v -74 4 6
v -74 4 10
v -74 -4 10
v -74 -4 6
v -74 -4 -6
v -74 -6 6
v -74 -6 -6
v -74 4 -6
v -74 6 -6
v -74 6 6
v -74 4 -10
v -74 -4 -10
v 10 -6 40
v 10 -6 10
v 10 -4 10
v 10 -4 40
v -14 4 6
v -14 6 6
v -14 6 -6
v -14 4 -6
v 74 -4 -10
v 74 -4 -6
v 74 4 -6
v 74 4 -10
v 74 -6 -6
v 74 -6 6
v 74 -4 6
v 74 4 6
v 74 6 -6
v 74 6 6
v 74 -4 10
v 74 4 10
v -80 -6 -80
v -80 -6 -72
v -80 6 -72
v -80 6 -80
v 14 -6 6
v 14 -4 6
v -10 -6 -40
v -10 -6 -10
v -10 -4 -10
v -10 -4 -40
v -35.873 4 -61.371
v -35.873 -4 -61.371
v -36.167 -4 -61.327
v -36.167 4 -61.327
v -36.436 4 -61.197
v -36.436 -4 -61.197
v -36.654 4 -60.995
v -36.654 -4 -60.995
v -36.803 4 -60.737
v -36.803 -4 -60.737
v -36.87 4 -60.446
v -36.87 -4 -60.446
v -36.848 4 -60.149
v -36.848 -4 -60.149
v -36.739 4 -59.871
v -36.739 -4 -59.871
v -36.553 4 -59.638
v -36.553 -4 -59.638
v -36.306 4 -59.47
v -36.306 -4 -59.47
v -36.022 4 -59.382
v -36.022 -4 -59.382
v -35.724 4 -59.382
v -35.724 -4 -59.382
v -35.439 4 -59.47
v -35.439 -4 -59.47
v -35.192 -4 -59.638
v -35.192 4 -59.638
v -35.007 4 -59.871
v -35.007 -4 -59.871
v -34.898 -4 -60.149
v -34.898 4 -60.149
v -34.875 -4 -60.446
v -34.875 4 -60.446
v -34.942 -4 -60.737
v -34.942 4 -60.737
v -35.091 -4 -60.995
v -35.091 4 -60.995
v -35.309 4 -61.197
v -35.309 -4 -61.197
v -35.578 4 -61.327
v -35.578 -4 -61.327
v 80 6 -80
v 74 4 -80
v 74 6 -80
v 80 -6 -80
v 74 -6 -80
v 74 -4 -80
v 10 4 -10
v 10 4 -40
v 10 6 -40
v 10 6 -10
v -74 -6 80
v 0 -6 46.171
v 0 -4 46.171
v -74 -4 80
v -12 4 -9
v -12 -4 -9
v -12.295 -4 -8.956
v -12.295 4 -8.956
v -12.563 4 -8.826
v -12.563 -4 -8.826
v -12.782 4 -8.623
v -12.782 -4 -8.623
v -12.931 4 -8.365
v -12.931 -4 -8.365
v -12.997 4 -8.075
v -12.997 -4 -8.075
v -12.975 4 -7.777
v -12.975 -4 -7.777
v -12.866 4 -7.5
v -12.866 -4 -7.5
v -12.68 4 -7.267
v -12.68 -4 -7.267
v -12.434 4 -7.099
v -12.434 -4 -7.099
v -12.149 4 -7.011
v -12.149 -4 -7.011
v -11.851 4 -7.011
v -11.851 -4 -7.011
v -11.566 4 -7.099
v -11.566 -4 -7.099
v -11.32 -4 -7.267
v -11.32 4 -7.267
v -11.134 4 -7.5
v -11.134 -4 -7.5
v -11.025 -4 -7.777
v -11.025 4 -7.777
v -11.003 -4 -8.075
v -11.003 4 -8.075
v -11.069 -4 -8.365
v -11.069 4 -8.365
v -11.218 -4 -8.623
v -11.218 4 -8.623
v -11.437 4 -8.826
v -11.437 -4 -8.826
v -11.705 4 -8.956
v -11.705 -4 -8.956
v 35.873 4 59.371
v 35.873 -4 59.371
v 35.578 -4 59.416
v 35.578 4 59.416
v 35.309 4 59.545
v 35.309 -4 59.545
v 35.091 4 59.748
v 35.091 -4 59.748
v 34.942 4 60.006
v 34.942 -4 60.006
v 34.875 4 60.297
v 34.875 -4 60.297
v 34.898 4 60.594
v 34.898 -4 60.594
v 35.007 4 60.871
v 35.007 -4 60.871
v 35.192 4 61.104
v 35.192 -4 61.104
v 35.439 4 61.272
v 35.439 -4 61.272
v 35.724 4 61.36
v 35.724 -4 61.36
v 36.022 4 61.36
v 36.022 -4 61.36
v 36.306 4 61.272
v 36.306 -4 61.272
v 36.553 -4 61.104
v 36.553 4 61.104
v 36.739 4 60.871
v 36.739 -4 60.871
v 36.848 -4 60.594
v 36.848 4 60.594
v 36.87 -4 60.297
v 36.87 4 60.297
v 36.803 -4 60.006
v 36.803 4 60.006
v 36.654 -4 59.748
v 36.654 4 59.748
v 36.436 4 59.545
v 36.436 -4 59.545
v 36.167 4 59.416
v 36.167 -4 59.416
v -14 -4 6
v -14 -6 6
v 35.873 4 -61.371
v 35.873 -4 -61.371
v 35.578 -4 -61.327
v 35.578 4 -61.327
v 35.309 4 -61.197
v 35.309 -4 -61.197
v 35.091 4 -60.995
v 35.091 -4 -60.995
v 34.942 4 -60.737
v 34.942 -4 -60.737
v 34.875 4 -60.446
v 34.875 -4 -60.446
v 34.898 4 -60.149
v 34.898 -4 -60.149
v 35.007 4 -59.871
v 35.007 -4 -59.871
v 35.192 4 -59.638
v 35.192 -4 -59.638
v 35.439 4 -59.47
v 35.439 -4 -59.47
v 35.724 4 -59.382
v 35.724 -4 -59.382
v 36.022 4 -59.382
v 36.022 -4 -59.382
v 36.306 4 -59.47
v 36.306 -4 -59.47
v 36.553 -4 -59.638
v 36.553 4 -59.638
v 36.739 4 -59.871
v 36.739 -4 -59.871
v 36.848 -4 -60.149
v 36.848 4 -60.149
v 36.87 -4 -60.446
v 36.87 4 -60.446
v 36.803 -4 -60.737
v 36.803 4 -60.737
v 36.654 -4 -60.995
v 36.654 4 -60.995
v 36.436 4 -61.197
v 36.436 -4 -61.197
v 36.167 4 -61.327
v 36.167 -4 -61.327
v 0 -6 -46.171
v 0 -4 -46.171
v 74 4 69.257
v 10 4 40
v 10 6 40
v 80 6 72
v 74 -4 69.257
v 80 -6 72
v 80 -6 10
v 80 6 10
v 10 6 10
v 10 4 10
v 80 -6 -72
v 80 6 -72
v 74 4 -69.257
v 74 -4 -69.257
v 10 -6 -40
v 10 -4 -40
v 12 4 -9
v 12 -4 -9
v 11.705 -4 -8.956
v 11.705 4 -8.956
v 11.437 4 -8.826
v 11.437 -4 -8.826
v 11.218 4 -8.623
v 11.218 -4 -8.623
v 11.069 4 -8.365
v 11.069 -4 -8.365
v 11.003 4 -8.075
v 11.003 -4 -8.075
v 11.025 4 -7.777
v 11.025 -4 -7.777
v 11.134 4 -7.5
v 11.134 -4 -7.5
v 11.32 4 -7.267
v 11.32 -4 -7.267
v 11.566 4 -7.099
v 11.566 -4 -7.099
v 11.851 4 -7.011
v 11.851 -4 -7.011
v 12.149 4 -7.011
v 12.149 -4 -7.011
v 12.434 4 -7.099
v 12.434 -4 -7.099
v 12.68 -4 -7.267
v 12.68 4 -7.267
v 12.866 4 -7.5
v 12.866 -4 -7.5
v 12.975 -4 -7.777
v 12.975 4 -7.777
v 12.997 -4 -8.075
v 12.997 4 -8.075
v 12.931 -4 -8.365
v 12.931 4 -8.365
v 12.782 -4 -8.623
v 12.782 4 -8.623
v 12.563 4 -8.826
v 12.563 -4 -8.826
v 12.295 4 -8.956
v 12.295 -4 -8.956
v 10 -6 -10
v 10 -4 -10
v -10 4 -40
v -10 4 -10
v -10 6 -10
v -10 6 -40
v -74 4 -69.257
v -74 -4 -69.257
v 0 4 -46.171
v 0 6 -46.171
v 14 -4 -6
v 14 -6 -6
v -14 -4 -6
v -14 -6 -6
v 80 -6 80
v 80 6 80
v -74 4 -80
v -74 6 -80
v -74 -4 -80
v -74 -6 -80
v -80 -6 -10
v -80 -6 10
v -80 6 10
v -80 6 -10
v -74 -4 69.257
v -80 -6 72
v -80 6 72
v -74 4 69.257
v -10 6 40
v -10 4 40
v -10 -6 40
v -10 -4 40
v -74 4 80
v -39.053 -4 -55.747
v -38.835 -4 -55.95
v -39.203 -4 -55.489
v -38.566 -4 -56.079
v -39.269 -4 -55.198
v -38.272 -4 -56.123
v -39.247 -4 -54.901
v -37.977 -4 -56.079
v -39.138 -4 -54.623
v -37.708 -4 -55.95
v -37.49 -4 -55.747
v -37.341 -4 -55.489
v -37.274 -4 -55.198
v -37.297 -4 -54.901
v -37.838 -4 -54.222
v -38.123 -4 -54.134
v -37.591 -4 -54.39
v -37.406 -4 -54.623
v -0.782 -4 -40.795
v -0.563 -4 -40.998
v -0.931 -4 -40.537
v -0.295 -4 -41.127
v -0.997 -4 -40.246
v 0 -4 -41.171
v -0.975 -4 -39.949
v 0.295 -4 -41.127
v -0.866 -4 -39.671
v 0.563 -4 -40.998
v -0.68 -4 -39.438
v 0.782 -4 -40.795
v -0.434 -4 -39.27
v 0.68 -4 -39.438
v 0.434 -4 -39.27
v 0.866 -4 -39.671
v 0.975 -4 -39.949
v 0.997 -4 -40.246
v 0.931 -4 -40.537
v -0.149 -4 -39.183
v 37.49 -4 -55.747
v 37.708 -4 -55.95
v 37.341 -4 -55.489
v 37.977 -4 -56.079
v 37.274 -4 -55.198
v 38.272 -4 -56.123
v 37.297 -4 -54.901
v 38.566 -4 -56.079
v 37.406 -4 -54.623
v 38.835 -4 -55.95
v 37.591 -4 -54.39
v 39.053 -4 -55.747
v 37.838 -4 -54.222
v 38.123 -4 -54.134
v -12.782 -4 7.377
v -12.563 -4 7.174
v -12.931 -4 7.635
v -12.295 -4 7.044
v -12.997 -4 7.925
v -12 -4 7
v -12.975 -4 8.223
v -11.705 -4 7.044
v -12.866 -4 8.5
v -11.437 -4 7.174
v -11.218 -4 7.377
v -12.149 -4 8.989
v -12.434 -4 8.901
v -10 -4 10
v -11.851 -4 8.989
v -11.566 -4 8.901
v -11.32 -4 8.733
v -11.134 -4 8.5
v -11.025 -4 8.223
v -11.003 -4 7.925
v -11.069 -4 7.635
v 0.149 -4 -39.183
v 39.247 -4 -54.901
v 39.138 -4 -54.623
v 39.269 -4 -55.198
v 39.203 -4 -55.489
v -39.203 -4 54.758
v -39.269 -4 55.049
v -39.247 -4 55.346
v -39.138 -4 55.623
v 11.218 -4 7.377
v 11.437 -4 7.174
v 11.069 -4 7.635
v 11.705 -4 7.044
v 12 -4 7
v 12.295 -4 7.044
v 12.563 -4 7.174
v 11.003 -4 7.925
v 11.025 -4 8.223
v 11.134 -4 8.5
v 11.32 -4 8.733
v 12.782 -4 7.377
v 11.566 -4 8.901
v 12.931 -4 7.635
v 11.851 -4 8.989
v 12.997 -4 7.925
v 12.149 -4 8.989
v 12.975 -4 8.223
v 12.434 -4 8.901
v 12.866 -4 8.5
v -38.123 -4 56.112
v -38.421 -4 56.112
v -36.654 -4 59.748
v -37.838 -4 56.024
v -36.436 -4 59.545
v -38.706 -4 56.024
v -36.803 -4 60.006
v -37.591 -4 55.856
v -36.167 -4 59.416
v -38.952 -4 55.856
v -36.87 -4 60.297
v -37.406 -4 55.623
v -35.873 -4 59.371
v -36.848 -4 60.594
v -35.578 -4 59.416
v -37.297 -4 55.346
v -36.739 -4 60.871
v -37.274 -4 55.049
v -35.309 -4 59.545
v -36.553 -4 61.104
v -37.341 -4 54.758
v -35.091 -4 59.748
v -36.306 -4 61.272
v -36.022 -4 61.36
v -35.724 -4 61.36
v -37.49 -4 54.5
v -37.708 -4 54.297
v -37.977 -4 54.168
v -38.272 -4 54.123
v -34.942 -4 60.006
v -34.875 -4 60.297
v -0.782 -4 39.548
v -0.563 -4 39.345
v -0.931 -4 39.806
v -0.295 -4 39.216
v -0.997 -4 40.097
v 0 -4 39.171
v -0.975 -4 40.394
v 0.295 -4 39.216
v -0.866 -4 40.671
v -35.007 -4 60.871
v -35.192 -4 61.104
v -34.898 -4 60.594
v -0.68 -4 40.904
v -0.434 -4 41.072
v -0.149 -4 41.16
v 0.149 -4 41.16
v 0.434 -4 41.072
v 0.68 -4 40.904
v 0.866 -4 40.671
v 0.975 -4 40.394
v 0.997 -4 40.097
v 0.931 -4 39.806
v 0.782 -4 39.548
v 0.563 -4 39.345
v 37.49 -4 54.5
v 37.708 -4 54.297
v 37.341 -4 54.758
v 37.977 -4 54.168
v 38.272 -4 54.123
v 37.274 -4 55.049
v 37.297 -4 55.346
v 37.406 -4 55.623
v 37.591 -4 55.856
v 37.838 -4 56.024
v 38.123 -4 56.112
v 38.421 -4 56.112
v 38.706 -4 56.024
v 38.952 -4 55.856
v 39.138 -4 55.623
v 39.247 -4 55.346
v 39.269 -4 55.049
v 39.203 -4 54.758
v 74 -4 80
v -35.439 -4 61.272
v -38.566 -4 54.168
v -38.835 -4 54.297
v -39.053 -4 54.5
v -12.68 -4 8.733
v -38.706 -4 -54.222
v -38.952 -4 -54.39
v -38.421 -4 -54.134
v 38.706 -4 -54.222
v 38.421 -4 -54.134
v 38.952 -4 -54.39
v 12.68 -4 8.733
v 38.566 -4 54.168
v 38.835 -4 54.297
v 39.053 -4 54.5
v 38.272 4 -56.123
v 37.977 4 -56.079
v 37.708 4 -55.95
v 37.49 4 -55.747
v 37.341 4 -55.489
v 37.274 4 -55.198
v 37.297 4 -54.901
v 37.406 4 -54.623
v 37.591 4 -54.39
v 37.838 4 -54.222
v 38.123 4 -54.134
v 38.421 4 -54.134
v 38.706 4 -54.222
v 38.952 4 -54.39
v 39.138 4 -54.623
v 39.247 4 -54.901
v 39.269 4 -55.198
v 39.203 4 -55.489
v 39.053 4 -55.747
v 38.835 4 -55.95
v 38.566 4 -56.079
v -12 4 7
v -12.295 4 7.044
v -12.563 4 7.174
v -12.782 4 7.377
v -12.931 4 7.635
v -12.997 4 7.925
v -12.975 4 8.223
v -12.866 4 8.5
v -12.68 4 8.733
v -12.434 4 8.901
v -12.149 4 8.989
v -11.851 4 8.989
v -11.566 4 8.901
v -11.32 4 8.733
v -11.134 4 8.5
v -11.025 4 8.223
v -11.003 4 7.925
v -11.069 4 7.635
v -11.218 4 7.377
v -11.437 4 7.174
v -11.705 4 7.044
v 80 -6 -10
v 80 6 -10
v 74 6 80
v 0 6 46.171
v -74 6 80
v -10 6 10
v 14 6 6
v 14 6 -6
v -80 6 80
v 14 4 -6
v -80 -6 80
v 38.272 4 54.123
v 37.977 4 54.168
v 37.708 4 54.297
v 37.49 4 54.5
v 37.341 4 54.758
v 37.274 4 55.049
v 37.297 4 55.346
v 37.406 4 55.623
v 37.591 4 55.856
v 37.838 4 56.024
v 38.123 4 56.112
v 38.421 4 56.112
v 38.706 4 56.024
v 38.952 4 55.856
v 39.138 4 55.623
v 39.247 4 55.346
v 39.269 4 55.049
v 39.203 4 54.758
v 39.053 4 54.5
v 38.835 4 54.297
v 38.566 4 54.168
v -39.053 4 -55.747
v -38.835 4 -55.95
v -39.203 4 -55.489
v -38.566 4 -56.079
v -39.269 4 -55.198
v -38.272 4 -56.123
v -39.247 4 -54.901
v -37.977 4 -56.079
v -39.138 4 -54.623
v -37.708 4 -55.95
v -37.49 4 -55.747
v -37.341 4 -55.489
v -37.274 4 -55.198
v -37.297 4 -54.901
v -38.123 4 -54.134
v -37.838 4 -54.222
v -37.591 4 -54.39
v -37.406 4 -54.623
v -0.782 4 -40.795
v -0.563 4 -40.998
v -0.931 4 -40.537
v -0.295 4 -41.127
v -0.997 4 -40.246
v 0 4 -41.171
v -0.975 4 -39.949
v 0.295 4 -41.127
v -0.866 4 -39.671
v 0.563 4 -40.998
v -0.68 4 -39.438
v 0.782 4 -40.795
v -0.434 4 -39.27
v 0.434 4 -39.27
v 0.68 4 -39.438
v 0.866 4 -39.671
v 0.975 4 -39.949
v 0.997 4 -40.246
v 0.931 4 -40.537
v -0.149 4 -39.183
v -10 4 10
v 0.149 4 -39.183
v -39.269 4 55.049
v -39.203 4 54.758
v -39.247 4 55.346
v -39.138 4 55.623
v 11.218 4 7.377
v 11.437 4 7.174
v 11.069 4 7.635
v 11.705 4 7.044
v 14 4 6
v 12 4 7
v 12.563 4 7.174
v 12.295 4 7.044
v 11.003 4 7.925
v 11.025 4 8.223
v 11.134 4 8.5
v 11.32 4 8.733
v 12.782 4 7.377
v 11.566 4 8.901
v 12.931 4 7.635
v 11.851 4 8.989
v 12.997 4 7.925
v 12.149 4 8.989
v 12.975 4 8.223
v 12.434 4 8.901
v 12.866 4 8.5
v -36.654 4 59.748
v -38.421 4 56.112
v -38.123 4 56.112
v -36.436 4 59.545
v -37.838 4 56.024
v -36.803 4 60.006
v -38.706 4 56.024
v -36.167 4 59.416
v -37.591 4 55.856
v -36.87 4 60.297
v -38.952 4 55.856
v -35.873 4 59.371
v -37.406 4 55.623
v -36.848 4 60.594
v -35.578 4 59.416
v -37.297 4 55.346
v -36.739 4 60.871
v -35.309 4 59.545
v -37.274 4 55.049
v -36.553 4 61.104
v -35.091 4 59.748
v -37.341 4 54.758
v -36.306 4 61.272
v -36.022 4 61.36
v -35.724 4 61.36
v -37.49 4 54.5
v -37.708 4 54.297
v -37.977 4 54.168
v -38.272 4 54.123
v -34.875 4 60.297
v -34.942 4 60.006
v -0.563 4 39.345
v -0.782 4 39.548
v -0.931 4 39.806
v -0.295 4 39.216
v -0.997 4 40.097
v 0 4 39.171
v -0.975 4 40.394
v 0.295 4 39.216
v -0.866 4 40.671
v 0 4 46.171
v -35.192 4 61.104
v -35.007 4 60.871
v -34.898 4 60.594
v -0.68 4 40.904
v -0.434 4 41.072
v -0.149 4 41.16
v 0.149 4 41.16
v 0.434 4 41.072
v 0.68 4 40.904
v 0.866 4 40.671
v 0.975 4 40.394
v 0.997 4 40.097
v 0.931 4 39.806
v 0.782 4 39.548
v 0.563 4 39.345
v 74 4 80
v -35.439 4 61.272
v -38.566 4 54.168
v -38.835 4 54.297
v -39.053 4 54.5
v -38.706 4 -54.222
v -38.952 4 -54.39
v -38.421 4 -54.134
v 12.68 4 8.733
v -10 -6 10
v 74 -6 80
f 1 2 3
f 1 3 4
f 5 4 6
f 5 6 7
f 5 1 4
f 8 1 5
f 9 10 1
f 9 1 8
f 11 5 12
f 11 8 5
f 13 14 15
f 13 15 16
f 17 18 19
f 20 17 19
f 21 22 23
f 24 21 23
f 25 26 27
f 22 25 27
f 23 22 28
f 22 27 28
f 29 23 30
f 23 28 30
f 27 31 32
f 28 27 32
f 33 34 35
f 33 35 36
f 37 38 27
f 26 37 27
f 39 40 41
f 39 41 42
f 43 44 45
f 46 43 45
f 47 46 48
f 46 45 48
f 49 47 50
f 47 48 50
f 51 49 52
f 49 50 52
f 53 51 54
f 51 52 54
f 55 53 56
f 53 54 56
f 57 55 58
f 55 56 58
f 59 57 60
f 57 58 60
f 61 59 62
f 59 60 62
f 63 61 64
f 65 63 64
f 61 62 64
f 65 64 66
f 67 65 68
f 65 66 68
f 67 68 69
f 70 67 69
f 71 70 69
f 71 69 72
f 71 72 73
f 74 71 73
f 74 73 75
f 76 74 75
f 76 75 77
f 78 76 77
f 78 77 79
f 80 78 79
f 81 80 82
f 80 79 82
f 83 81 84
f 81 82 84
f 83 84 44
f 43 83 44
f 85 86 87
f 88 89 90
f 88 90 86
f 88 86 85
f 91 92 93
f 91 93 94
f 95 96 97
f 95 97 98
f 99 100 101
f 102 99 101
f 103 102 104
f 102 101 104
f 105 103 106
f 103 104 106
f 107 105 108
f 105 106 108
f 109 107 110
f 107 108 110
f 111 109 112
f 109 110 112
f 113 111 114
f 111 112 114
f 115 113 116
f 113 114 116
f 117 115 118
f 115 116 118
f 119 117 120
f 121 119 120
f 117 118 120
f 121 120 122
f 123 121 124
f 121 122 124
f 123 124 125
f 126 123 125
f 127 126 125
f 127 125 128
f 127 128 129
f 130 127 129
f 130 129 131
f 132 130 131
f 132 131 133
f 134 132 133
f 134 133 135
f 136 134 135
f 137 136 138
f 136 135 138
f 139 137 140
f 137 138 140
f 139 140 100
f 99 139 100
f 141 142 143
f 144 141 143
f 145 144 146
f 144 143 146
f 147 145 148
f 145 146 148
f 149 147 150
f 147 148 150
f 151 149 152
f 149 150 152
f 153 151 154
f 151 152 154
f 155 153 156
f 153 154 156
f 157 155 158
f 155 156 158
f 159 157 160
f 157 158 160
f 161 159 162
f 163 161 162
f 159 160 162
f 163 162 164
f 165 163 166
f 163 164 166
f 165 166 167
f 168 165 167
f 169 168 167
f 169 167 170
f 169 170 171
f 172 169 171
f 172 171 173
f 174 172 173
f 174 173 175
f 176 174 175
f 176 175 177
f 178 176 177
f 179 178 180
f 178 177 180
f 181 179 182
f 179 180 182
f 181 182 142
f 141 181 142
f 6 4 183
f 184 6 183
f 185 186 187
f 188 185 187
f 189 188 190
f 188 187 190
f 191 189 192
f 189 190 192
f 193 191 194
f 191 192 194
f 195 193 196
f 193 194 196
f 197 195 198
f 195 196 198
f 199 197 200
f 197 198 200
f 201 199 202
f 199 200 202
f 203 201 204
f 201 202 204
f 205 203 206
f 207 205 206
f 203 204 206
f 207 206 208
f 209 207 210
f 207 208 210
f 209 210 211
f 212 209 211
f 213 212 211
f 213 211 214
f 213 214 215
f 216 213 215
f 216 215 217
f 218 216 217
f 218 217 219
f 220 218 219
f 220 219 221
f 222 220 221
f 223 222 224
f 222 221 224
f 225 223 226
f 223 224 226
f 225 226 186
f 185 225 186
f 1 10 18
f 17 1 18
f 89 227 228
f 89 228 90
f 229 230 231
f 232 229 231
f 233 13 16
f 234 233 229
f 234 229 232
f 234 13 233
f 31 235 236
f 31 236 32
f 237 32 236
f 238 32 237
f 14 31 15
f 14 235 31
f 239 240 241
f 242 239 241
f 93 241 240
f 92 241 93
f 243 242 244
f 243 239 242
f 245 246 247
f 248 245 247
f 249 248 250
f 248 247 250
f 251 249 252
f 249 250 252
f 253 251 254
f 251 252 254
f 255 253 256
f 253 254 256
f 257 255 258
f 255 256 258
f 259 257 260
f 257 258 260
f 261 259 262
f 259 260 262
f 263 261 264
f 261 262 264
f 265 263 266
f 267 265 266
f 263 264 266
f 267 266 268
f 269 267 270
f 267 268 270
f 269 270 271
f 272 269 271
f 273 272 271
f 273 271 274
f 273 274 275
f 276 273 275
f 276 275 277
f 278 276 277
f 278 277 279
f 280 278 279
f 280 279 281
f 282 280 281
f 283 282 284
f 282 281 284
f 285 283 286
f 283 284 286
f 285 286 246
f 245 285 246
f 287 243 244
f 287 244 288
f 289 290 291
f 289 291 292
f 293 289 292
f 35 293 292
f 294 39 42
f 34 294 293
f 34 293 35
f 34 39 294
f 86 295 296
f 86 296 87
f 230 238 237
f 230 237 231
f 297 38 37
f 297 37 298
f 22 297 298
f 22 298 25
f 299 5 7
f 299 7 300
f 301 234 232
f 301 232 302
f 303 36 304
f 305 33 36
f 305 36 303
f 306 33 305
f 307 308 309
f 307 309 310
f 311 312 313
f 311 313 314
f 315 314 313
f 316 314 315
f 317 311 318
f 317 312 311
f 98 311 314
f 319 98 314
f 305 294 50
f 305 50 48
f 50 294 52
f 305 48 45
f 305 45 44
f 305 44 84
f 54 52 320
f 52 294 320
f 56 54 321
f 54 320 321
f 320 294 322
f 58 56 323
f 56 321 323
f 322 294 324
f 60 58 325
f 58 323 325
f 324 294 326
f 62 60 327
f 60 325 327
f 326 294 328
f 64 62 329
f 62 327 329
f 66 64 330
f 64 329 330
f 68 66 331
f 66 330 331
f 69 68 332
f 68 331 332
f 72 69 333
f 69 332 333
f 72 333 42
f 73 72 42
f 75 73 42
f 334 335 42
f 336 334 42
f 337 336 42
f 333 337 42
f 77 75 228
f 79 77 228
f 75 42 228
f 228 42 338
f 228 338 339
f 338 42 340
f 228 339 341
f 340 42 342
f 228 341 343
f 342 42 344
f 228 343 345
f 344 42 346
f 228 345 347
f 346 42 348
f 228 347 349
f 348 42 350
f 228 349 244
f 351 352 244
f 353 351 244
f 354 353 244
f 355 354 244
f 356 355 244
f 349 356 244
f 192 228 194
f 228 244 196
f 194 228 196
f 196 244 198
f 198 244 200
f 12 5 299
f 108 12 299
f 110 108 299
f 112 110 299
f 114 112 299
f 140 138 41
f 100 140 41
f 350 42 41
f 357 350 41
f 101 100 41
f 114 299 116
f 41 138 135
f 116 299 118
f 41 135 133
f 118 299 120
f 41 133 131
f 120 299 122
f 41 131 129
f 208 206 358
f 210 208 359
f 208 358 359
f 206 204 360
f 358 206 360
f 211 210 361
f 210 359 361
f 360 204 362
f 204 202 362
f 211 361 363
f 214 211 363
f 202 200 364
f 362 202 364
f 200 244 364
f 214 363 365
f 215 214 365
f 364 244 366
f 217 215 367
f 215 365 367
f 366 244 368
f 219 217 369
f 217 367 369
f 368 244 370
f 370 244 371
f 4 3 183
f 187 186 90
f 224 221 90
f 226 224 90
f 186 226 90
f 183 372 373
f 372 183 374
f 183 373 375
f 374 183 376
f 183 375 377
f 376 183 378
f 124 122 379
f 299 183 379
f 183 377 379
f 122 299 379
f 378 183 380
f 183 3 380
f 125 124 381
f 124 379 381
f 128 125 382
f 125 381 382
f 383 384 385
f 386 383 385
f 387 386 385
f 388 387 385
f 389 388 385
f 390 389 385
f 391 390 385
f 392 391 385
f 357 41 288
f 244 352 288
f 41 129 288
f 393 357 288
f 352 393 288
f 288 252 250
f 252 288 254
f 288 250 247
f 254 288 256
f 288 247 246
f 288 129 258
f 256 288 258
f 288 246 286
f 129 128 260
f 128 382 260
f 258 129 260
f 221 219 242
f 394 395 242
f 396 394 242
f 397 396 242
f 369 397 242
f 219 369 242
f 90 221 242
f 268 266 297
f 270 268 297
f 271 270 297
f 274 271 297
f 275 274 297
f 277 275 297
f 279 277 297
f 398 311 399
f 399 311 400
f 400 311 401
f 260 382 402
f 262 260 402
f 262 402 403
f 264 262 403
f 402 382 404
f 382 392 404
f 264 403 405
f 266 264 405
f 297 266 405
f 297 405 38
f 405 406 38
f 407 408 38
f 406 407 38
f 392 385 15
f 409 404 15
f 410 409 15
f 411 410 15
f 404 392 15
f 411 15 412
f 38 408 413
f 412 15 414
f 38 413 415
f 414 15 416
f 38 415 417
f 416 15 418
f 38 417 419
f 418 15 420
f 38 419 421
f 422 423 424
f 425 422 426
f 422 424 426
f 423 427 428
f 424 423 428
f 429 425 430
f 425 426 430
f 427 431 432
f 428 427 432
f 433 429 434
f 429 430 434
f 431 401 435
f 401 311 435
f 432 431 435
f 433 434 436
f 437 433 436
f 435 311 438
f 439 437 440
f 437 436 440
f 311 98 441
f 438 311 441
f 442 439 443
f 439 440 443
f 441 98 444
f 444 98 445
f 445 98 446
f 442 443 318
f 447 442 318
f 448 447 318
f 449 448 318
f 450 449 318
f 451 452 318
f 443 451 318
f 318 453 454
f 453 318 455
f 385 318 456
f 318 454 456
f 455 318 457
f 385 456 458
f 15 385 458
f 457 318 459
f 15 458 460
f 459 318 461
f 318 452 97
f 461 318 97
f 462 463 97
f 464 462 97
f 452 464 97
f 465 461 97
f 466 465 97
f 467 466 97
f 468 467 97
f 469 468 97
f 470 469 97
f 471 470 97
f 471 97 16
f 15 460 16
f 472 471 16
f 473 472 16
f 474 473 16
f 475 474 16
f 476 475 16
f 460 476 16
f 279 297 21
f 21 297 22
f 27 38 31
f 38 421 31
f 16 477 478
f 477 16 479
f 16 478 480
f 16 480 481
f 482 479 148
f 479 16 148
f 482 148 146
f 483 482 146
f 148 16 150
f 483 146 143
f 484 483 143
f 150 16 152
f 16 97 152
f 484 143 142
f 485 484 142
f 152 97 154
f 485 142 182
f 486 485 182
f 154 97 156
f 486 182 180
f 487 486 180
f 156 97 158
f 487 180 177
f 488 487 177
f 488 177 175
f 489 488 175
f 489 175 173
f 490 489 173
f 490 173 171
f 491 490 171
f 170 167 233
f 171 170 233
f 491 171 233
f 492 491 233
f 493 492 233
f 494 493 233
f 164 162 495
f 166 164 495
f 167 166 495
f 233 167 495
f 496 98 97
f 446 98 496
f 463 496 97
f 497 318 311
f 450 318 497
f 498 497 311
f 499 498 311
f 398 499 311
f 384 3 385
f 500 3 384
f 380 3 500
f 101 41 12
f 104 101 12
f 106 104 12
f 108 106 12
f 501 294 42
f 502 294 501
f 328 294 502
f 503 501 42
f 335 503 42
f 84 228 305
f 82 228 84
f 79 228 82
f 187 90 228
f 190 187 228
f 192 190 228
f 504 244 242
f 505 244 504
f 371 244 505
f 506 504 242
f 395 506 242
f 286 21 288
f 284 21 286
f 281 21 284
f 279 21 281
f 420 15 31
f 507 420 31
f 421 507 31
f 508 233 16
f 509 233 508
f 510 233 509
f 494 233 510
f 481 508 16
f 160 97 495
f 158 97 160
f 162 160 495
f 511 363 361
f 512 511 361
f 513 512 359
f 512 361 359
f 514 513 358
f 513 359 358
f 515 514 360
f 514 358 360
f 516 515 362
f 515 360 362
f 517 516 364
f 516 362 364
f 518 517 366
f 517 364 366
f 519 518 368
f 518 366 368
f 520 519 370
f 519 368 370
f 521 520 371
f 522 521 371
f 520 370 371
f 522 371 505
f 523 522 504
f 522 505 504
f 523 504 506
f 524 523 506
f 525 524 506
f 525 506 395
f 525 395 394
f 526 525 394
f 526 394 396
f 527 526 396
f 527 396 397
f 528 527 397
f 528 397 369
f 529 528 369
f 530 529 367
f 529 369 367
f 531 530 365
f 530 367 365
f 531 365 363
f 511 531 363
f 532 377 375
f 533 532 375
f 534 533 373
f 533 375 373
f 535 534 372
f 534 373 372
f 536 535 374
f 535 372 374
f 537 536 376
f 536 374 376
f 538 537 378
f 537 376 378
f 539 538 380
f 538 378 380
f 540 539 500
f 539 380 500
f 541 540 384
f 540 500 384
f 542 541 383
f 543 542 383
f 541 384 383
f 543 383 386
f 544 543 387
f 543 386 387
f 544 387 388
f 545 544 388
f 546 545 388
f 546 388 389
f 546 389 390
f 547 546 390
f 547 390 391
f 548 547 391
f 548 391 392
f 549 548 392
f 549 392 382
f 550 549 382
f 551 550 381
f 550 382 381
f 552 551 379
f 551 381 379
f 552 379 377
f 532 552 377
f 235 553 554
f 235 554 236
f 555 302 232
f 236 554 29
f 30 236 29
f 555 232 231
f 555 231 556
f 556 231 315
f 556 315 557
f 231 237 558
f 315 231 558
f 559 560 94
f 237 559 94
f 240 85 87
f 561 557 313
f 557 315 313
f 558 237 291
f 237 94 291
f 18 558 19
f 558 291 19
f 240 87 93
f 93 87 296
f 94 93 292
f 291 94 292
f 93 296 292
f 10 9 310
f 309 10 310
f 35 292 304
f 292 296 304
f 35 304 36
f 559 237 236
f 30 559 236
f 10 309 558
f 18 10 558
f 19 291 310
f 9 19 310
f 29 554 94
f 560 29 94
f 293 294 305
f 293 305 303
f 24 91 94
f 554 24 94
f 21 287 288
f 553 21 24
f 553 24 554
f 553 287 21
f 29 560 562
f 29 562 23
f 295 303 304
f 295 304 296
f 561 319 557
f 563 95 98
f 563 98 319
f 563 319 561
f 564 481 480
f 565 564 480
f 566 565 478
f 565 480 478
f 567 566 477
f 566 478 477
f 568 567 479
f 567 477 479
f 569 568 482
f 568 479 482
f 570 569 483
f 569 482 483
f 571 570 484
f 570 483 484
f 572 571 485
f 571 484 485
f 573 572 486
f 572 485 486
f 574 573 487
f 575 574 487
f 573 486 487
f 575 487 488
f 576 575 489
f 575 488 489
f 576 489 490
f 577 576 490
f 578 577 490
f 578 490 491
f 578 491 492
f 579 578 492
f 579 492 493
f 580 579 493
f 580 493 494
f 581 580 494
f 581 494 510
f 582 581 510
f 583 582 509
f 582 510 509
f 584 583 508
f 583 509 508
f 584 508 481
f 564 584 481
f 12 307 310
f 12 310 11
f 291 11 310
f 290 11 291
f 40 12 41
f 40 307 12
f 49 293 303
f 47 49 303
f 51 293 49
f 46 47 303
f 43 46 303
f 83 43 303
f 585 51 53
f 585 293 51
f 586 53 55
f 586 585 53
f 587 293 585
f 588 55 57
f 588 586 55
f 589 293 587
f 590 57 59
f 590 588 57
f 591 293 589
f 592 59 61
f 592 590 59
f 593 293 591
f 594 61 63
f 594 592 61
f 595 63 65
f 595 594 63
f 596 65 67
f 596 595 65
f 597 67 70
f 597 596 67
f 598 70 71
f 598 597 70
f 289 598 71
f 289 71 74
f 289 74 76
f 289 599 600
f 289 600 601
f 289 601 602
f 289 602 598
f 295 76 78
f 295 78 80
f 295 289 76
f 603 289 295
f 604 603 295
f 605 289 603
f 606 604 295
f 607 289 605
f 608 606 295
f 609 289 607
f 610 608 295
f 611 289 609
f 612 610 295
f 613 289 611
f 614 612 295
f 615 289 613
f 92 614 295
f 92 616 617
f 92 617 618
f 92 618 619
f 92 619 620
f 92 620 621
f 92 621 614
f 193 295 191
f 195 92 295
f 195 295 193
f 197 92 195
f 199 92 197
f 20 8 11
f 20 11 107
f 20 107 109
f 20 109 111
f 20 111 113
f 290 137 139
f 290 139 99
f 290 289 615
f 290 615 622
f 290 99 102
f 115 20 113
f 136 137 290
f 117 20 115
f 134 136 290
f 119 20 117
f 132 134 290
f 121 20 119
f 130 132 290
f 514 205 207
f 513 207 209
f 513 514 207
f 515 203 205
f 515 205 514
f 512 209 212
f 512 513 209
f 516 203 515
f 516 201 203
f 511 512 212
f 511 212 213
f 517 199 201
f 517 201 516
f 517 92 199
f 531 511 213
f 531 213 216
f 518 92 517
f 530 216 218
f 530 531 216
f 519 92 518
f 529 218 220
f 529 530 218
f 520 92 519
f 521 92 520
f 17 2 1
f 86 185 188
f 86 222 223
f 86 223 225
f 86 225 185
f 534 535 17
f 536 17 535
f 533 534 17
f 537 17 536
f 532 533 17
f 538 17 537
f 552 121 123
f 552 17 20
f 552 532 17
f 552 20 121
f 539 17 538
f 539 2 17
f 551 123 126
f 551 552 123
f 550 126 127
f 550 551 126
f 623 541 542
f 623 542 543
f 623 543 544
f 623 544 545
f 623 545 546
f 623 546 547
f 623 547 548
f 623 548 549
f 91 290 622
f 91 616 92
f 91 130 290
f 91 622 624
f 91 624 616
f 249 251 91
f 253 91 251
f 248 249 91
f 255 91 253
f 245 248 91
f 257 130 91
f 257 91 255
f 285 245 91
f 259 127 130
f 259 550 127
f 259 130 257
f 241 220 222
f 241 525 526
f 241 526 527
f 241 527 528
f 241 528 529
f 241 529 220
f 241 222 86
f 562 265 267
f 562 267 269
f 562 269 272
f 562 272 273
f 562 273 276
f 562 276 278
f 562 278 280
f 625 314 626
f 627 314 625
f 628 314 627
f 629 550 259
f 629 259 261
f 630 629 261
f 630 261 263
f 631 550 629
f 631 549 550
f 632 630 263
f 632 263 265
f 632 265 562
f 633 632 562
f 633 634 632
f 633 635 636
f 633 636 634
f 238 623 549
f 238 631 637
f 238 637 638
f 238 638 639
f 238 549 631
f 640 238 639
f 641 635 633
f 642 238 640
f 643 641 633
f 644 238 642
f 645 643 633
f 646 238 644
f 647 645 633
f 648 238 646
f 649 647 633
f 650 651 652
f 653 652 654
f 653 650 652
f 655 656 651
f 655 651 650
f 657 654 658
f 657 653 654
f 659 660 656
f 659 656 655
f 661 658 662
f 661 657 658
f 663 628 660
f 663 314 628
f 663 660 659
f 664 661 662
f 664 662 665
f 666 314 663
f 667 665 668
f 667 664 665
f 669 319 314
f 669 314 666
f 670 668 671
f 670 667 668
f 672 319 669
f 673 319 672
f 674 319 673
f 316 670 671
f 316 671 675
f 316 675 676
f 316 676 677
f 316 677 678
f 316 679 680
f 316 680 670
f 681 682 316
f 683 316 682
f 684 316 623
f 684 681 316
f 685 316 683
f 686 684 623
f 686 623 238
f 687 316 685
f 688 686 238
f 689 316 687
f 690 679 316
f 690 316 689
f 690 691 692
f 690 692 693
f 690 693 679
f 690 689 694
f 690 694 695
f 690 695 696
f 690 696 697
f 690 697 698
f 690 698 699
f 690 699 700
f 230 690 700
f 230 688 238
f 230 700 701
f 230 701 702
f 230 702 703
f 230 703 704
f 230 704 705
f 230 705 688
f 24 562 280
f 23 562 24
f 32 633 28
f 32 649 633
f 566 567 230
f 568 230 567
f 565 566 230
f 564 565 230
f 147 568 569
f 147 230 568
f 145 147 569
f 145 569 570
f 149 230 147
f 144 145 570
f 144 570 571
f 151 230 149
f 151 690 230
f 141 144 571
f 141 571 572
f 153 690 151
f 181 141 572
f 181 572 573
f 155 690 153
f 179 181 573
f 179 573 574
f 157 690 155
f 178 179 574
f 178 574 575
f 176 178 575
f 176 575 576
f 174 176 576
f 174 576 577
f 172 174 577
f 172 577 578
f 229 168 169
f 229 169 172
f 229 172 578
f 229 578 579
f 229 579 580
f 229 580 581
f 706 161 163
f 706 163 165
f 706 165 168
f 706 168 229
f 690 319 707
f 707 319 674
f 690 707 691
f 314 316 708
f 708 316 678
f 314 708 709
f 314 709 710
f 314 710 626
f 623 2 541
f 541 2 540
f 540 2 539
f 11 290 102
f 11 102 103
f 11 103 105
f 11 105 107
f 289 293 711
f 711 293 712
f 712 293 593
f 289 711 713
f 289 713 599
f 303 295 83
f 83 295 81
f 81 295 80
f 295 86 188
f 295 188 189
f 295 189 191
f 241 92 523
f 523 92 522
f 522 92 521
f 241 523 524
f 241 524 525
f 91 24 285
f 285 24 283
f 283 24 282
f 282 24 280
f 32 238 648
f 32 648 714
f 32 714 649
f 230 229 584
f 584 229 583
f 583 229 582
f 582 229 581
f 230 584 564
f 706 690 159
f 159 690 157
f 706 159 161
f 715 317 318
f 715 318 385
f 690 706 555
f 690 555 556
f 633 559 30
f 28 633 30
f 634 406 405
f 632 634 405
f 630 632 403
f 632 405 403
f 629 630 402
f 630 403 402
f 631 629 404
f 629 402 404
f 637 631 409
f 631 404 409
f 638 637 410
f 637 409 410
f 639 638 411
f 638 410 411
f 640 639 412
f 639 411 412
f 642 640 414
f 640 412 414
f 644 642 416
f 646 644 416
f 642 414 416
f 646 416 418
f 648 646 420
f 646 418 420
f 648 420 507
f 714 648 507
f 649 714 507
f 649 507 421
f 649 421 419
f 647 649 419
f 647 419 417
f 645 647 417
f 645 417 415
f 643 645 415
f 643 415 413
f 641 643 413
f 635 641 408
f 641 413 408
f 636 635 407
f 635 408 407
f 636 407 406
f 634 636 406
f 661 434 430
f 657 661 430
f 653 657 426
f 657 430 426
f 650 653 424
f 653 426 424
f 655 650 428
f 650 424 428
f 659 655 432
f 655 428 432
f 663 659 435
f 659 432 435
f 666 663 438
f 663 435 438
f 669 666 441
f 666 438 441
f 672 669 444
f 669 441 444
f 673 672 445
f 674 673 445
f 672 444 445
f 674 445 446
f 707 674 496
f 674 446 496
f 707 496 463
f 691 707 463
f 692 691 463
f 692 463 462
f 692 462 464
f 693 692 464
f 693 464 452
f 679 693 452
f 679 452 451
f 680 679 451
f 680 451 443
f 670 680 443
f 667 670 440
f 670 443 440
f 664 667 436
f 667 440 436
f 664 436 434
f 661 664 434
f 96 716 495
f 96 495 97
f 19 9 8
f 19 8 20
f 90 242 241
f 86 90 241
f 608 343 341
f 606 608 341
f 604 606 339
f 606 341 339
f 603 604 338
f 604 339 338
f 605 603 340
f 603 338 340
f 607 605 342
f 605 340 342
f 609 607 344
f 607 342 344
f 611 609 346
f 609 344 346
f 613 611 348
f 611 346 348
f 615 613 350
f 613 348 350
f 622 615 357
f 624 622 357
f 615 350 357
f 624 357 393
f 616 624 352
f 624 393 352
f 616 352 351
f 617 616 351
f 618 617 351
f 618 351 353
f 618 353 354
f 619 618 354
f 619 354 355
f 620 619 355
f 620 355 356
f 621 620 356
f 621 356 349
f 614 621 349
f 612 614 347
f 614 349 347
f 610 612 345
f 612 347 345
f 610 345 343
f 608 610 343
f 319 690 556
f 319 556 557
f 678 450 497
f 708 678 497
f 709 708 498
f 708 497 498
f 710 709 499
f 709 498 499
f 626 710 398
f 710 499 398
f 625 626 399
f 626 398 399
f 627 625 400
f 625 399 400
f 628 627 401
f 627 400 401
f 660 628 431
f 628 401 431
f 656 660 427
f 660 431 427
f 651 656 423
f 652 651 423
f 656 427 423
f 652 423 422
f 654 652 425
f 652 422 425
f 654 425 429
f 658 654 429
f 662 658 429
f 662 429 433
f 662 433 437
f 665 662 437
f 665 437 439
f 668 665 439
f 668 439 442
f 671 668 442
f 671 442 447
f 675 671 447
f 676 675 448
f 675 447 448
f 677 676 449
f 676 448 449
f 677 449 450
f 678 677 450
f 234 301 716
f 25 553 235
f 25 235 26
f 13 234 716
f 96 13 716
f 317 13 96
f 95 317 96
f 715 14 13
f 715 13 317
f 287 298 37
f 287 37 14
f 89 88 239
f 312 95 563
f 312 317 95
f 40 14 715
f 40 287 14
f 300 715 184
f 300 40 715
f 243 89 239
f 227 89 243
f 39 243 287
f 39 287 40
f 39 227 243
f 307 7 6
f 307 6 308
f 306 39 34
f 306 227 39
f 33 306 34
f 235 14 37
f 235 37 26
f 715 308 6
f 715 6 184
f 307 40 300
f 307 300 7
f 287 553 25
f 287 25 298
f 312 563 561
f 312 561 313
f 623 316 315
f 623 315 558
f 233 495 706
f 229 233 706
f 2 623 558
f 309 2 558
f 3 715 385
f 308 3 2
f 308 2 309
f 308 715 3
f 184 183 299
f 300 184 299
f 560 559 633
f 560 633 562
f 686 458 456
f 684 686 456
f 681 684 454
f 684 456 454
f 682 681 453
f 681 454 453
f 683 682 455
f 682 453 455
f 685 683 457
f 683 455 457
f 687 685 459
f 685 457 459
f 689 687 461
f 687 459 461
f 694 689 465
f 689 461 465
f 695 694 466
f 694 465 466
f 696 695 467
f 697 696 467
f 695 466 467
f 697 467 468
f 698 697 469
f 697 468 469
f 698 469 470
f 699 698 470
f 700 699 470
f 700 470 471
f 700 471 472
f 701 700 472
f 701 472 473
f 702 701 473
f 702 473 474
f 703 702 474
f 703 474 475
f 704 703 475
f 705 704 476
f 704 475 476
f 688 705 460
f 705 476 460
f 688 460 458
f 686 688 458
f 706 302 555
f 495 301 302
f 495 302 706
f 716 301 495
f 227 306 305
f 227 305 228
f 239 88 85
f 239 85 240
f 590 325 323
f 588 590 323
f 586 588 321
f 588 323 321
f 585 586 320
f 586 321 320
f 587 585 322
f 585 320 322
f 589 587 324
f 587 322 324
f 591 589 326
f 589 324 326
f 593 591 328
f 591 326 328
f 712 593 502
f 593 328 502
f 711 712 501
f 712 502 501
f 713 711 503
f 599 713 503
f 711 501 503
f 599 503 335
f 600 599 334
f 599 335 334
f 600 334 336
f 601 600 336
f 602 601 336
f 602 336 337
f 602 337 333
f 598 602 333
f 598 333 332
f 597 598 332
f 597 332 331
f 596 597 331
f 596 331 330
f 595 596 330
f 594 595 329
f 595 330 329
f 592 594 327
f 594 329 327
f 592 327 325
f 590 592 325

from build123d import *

# Parameters (mm, degrees)
BOSS_EXTRUDE1_DEPTH      = 6
BOSS_EXTRUDE1_DEPTH_BACK = 6
SKETCH2_W                = 148
SKETCH2_H                = 8
CUT_EXTRUDE1_DEPTH       = 160
SKETCH4_W                = 60
SKETCH4_H                = 12
CUT_EXTRUDE2_DEPTH       = 12
SKETCH5_R                = 1
BOSS_EXTRUDE2_DEPTH      = 8


with BuildPart() as part:
    # Sketch1 → Boss-Extrude1 (new, two sides: drawn at the far end of the back side and taken through both)
    with BuildSketch(Plane(origin=(0, 0, 0), x_dir=(1, 0, 0), z_dir=(0, 1, 0)).offset(-BOSS_EXTRUDE1_DEPTH_BACK)):
        Polygon((80, 10), (80, -10), (10, -10), (10, -40), (80, -72), (80, -80), (74, -80), (0, -46.171428571), (-74, -80), (-80, -80), (-80, -72), (-10, -40), (-10, -10), (-80, -10), (-80, 10), (-10, 10), (-10, 40), (-80, 72), (-80, 80), (-74, 80), (0, 46.171428571), (74, 80), (80, 80), (80, 72), (10, 40), (10, 10), align=None)
    extrude(amount=BOSS_EXTRUDE1_DEPTH + BOSS_EXTRUDE1_DEPTH_BACK)

    # Sketch2 → Cut-Extrude1 (cut)
    with BuildSketch(Plane.XY.offset(80)):
        Rectangle(SKETCH2_W, SKETCH2_H)
    extrude(amount=-CUT_EXTRUDE1_DEPTH, mode=Mode.SUBTRACT)

    # Sketch4 → Cut-Extrude2 (cut)
    with BuildSketch(Plane(origin=(0, 6, 0), x_dir=(1, 0, 0), z_dir=(0, 1, 0))):
        with Locations((-44, 0)):
            Rectangle(SKETCH4_W, SKETCH4_H)
        with Locations((44, 0)):
            Rectangle(SKETCH4_W, SKETCH4_H)
    extrude(amount=-CUT_EXTRUDE2_DEPTH, mode=Mode.SUBTRACT)

    # Sketch5 → Boss-Extrude2 (add)
    with BuildSketch(Plane(origin=(0, -4, 0), x_dir=(1, 0, 0), z_dir=(0, 1, 0))):
        with Locations((-35.87258255, -60.371251291)):
            Circle(SKETCH5_R)
        with Locations((-38.271663698, -55.12326128)):
            Circle(SKETCH5_R)
        with Locations((-12, -8)):
            Circle(SKETCH5_R)
        with Locations((0, -40.171428571)):
            Circle(SKETCH5_R)
        with Locations((12, -8)):
            Circle(SKETCH5_R)
        with Locations((35.87258255, -60.371251291)):
            Circle(SKETCH5_R)
        with Locations((38.271663698, -55.12326128)):
            Circle(SKETCH5_R)
        with Locations((38.271663698, 55.12326128)):
            Circle(SKETCH5_R)
        with Locations((35.87258255, 60.371251291)):
            Circle(SKETCH5_R)
        with Locations((-35.87258255, 60.371251291)):
            Circle(SKETCH5_R)
        with Locations((-38.271663698, 55.12326128)):
            Circle(SKETCH5_R)
        with Locations((0, 40.171428571)):
            Circle(SKETCH5_R)
        with Locations((12, 8)):
            Circle(SKETCH5_R)
        with Locations((-12, 8)):
            Circle(SKETCH5_R)
    extrude(amount=BOSS_EXTRUDE2_DEPTH)


solid = part.part
